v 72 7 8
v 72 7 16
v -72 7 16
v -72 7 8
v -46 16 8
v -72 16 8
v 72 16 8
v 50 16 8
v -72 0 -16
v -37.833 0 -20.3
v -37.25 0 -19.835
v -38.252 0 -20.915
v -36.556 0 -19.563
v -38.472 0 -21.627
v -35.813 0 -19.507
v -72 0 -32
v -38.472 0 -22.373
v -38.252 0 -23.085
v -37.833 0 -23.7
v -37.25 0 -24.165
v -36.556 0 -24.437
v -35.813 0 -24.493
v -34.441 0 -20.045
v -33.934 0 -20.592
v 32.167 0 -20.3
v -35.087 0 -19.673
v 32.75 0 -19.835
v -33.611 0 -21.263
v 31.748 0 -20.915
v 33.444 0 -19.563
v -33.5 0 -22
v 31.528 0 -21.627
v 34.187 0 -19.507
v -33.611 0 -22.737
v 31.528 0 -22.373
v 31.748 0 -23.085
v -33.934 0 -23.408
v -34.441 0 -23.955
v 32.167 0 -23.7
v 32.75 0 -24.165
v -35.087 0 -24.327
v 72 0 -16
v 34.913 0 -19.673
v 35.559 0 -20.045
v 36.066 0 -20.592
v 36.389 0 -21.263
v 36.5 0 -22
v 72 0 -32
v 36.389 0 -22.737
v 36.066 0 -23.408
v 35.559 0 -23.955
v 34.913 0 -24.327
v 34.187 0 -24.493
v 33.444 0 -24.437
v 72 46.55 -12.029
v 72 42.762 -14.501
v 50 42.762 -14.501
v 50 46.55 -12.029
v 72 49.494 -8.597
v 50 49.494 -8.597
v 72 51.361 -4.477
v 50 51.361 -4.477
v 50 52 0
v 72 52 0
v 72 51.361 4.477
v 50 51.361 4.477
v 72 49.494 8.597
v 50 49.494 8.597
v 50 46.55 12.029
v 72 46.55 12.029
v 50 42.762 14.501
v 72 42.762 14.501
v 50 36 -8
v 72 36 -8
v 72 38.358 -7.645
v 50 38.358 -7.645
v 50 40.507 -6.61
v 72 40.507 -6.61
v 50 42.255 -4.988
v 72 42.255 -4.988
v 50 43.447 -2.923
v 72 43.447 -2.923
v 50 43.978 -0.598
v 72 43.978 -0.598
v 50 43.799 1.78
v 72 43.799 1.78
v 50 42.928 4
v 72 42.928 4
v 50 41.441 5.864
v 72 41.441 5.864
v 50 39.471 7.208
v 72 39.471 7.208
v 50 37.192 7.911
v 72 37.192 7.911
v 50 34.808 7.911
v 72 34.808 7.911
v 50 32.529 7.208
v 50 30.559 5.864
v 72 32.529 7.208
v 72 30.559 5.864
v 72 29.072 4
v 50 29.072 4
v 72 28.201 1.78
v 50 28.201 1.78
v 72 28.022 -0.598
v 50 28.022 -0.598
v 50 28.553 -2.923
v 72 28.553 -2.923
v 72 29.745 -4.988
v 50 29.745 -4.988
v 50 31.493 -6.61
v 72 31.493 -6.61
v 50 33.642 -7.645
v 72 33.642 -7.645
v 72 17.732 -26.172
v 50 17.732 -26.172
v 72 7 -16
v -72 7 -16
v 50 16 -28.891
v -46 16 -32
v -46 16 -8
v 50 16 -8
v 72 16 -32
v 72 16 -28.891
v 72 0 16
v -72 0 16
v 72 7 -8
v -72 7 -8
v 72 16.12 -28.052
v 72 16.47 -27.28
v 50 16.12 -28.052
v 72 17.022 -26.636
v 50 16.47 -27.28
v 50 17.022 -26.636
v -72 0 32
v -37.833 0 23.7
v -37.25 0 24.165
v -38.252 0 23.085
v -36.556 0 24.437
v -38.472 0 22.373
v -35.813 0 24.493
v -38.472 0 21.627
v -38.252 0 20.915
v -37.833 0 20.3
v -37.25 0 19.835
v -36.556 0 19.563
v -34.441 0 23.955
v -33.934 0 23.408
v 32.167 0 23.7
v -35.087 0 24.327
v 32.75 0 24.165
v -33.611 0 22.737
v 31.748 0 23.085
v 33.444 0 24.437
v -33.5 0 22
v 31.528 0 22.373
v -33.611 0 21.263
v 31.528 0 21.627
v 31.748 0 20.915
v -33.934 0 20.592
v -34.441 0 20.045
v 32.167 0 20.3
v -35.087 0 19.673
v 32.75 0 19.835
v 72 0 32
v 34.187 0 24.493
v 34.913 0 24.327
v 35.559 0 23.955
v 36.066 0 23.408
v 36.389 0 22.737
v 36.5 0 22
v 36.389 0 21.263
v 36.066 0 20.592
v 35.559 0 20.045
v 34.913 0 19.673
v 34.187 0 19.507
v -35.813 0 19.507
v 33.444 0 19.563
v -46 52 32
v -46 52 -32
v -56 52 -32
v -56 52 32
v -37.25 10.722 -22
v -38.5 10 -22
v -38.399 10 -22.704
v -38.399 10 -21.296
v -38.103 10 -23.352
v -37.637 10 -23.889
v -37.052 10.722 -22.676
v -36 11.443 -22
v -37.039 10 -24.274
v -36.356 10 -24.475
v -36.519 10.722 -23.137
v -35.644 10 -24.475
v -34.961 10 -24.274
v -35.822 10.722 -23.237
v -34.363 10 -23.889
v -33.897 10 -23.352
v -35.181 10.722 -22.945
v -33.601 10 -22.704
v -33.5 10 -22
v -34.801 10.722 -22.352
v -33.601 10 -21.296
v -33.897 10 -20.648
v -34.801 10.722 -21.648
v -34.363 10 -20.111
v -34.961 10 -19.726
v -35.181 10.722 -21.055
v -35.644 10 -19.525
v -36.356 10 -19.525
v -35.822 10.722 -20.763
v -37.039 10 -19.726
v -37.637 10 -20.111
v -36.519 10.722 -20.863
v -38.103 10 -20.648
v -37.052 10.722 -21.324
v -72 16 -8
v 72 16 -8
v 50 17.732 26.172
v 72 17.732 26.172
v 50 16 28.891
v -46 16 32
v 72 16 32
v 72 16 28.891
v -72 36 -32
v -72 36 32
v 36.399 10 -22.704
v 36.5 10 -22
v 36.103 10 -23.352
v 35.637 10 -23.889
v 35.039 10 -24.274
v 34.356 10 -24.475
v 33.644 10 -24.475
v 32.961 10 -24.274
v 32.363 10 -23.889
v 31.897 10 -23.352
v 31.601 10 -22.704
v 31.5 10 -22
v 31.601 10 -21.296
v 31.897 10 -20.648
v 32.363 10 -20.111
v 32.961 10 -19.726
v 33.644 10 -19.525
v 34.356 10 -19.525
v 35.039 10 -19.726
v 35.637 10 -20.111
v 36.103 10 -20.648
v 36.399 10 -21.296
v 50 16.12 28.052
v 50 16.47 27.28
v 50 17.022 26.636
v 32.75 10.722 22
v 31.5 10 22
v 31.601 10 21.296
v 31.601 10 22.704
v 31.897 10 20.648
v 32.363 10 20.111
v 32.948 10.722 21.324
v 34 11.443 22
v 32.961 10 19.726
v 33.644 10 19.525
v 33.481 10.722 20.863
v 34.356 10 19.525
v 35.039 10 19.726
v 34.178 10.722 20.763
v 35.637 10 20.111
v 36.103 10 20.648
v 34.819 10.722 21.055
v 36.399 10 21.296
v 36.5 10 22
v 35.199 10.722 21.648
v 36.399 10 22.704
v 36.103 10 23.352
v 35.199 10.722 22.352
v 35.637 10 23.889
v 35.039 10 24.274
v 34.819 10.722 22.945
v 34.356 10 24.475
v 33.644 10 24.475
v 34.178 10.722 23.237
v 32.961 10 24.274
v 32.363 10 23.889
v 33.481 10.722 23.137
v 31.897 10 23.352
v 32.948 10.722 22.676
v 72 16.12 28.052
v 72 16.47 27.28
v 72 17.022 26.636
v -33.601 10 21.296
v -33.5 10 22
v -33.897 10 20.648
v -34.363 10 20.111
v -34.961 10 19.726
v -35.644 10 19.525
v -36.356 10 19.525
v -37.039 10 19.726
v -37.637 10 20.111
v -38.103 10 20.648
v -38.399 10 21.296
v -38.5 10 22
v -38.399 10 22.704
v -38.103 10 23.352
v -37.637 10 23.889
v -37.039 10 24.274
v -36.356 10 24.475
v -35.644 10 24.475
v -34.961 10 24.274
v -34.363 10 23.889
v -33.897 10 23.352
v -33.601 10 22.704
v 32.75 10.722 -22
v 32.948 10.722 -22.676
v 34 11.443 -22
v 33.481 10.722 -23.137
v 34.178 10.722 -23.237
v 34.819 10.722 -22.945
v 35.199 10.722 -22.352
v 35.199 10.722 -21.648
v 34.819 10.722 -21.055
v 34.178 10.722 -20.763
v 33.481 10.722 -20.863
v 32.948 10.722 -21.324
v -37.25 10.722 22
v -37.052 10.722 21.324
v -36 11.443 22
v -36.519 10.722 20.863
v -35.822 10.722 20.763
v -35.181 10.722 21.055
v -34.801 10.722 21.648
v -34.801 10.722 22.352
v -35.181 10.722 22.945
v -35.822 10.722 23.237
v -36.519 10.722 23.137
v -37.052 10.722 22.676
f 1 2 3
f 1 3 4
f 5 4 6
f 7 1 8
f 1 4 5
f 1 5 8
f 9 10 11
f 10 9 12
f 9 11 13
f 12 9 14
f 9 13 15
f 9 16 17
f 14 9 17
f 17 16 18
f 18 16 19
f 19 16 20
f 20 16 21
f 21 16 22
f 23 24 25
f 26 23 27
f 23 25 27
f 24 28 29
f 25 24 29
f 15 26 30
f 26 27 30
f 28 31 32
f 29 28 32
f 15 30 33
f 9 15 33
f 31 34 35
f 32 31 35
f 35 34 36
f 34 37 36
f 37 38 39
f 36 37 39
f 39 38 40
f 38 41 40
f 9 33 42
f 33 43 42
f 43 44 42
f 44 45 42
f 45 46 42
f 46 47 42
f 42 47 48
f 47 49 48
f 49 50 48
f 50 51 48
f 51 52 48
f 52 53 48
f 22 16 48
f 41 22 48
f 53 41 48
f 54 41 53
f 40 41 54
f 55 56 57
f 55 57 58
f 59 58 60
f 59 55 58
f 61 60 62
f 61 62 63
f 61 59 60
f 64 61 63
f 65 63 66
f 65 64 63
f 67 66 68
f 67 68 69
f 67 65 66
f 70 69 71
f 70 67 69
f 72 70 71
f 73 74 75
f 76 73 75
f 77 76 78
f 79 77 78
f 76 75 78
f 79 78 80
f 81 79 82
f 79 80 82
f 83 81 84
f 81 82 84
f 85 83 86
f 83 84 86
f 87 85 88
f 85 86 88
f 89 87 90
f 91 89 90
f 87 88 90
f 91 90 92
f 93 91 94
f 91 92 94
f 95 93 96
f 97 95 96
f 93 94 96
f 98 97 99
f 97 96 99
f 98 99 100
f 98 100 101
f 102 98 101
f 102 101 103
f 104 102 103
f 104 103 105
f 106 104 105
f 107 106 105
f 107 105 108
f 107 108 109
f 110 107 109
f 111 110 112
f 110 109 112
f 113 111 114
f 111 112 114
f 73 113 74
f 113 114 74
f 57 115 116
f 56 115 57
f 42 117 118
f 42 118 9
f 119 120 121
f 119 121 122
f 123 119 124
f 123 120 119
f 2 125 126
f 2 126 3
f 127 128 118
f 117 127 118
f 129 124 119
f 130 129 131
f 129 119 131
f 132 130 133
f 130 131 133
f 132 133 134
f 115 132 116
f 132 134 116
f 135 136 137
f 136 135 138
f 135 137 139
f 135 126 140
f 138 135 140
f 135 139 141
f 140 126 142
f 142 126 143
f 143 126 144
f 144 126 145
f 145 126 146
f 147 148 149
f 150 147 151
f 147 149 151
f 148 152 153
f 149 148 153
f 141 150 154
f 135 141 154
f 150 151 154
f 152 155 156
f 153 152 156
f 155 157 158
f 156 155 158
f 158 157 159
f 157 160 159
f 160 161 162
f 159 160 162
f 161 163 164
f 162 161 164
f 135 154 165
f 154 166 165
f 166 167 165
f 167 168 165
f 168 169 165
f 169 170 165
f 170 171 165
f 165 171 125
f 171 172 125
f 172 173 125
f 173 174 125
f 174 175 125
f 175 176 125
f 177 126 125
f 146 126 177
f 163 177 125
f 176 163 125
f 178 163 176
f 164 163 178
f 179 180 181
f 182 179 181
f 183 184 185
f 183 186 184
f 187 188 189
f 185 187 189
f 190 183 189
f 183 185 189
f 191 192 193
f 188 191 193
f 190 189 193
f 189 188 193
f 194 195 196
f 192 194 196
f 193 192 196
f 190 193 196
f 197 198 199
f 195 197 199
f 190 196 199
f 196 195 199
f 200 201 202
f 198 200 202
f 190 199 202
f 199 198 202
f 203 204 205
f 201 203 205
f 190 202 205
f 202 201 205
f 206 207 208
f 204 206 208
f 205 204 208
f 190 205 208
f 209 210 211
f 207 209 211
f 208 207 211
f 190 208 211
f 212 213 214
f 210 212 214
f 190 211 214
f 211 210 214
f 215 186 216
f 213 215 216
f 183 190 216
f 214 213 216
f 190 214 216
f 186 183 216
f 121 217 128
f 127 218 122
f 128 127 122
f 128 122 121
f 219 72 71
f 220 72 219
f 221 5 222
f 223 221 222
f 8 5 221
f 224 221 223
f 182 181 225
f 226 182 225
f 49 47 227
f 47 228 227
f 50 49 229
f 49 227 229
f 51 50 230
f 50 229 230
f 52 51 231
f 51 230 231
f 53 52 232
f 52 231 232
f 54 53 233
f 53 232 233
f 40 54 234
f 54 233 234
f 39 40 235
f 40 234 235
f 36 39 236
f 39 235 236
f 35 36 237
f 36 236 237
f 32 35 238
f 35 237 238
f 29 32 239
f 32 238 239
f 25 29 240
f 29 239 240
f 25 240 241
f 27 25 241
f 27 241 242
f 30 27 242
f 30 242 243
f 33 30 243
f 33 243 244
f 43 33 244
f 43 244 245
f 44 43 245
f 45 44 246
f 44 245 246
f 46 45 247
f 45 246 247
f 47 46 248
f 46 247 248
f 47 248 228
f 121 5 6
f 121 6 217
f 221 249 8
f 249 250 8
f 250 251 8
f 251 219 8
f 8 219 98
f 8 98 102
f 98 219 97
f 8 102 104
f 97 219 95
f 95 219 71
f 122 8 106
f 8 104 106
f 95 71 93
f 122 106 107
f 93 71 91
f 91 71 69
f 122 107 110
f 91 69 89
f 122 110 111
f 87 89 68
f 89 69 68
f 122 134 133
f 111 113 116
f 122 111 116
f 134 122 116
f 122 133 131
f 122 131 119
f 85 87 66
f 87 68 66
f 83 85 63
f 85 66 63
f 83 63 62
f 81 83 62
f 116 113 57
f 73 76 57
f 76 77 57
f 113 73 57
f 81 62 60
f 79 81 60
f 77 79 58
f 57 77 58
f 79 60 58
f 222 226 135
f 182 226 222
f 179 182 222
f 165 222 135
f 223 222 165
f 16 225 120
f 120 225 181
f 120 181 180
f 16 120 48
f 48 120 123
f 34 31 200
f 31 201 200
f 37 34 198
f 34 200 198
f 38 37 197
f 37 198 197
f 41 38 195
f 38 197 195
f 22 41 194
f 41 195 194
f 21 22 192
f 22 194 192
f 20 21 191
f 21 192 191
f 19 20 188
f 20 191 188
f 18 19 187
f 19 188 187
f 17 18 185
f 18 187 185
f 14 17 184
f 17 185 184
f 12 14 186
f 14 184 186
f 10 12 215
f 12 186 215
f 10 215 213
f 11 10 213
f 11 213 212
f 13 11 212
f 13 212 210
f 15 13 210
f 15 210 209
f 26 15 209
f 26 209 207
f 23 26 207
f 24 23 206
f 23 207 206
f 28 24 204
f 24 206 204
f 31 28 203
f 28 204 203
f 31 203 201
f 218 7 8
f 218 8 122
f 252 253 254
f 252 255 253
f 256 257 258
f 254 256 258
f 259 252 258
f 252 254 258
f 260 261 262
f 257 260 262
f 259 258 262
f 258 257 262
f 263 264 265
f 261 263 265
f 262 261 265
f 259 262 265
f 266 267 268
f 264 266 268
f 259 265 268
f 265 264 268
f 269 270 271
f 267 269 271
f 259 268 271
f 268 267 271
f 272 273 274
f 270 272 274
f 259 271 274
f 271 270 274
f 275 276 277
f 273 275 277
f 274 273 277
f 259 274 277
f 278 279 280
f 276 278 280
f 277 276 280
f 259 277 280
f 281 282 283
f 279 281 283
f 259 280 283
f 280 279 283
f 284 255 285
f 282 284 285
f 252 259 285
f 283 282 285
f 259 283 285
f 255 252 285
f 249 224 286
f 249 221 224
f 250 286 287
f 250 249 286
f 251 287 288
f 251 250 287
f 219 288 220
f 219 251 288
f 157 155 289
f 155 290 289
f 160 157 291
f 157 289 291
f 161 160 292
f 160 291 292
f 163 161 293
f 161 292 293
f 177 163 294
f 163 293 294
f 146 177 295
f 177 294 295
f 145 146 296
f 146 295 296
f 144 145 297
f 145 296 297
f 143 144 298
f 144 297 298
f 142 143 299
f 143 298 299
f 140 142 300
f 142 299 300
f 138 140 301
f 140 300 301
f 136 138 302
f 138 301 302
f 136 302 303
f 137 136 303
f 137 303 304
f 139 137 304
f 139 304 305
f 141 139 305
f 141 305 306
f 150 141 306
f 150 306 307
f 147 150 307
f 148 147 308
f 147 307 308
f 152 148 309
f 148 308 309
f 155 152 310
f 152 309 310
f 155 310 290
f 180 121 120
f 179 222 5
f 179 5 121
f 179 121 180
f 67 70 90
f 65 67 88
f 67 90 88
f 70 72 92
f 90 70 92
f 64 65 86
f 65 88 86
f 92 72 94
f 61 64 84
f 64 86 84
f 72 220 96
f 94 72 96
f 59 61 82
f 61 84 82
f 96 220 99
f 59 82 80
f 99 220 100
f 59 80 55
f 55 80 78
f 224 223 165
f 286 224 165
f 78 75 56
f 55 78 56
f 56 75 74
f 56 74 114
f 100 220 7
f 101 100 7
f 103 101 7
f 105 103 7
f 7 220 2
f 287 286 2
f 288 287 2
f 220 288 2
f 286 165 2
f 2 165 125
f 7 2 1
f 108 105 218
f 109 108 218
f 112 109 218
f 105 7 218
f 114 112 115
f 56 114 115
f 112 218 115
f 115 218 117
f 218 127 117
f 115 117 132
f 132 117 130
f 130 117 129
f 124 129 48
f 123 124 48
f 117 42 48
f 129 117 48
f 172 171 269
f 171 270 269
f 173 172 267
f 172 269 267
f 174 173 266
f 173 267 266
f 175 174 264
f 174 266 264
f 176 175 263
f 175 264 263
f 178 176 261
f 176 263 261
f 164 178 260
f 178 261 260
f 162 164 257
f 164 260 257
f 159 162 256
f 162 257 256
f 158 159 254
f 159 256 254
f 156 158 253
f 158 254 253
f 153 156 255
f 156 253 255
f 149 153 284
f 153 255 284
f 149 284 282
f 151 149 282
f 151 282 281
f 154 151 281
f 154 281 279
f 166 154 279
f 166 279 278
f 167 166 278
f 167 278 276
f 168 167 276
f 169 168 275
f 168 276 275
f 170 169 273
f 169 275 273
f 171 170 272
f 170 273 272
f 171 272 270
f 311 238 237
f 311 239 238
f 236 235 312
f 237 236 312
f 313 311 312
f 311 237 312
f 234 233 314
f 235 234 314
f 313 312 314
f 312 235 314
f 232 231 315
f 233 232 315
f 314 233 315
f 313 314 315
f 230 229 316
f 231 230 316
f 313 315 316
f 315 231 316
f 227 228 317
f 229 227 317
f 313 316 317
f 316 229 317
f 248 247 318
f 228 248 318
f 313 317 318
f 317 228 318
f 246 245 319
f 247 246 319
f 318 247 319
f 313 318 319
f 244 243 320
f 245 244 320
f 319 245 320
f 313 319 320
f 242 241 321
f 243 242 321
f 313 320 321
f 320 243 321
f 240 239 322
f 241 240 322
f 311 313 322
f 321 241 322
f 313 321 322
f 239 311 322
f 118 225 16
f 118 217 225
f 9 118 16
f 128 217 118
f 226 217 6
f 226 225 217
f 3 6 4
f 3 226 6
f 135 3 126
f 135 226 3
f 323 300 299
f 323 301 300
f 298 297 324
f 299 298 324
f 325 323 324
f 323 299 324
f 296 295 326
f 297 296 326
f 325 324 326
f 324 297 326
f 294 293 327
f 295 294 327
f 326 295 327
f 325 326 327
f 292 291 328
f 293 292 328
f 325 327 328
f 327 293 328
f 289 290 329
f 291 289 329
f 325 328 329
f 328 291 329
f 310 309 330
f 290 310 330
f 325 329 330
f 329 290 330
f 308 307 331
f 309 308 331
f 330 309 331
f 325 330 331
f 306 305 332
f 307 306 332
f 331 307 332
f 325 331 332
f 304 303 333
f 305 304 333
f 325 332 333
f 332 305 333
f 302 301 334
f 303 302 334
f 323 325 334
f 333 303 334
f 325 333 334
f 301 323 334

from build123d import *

# Parameters (mm, degrees)
SKETCH1_W                 = 144
SKETCH1_H                 = 64
BOSS_EXTRUDE1_DEPTH       = 16
BOSS_EXTRUDE2_DEPTH       = 64
SKETCH3_R                 = 8
BOSS_EXTRUDE3_DEPTH       = 22
FILLET1_R                 = 3
CUT_EXTRUDE1_DEPTH        = 157.409718368
M6X1_0_TAPPED_HOLE1_D     = 5
M6X1_0_TAPPED_HOLE1_DEPTH = 10
M6X1_0_TAPPED_HOLE1_TIP   = 1.443375673


with BuildPart() as part:
    # Sketch1 → Boss-Extrude1 (new body)
    with BuildSketch(Plane(origin=(0, 0, 0), x_dir=(1, 0, 0), z_dir=(0, 1, 0))):
        Rectangle(SKETCH1_W, SKETCH1_H)
    extrude(amount=BOSS_EXTRUDE1_DEPTH)

    # Sketch2 → Boss-Extrude2 (add)
    with BuildSketch(Plane.XY.offset(32)):
        Polygon((-46, 16), (-46, 52), (-56, 52), (-72, 36), (-72, 16), align=None)
    extrude(amount=-BOSS_EXTRUDE2_DEPTH)

    # Sketch3 → Boss-Extrude3 (add)
    with BuildSketch(Plane(origin=(72, 0, 0), x_dir=(0, 0, -1), z_dir=(1, 0, 0))):
        with BuildLine():
            Line((-14.500924593, 42.761892188), (-26.980199866, 16))
            Line((-26.980199866, 16), (26.980199866, 16))
            Line((26.980199866, 16), (14.500924593, 42.761892188))
            ThreePointArc((14.500924593, 42.761892188), (0, 52), (-14.500924593, 42.761892188))
        make_face()
        with Locations((0, 36)):
            Circle(SKETCH3_R, mode=Mode.SUBTRACT)
    extrude(amount=-BOSS_EXTRUDE3_DEPTH)

    # Fillet1
    fillet1_edges = [part.edges().sort_by_distance(p)[0] for p in [
        (61, 16, -26.980199866),
        (61, 16, 26.980199866),
    ]]
    fillet(fillet1_edges, radius=FILLET1_R)

    # Sketch4 → Cut-Extrude1 (cut, through all)
    with BuildSketch(Plane(origin=(72, 0, 0), x_dir=(0, 0, -1), z_dir=(1, 0, 0))):
        Polygon((-16, 0), (-16, 7), (-8, 7), (-8, 16), (8, 16), (8, 7), (16, 7), (16, 0), align=None)
    extrude(amount=-CUT_EXTRUDE1_DEPTH, mode=Mode.SUBTRACT)

    # M6x1.0 Tapped Hole1
    with Locations(Plane(origin=(0, 0, 0), x_dir=(-1, 0, 0), z_dir=(0, -1, 0))):
        with Locations((-34, -22), (36, -22), (36, 22), (-34, 22)):
            Hole(M6X1_0_TAPPED_HOLE1_D / 2, depth=M6X1_0_TAPPED_HOLE1_DEPTH)
            with Locations((0, 0, -(M6X1_0_TAPPED_HOLE1_DEPTH + M6X1_0_TAPPED_HOLE1_TIP / 2))):  # 120° drill point
                Cone(0, M6X1_0_TAPPED_HOLE1_D / 2, M6X1_0_TAPPED_HOLE1_TIP, mode=Mode.SUBTRACT)


solid = part.part
